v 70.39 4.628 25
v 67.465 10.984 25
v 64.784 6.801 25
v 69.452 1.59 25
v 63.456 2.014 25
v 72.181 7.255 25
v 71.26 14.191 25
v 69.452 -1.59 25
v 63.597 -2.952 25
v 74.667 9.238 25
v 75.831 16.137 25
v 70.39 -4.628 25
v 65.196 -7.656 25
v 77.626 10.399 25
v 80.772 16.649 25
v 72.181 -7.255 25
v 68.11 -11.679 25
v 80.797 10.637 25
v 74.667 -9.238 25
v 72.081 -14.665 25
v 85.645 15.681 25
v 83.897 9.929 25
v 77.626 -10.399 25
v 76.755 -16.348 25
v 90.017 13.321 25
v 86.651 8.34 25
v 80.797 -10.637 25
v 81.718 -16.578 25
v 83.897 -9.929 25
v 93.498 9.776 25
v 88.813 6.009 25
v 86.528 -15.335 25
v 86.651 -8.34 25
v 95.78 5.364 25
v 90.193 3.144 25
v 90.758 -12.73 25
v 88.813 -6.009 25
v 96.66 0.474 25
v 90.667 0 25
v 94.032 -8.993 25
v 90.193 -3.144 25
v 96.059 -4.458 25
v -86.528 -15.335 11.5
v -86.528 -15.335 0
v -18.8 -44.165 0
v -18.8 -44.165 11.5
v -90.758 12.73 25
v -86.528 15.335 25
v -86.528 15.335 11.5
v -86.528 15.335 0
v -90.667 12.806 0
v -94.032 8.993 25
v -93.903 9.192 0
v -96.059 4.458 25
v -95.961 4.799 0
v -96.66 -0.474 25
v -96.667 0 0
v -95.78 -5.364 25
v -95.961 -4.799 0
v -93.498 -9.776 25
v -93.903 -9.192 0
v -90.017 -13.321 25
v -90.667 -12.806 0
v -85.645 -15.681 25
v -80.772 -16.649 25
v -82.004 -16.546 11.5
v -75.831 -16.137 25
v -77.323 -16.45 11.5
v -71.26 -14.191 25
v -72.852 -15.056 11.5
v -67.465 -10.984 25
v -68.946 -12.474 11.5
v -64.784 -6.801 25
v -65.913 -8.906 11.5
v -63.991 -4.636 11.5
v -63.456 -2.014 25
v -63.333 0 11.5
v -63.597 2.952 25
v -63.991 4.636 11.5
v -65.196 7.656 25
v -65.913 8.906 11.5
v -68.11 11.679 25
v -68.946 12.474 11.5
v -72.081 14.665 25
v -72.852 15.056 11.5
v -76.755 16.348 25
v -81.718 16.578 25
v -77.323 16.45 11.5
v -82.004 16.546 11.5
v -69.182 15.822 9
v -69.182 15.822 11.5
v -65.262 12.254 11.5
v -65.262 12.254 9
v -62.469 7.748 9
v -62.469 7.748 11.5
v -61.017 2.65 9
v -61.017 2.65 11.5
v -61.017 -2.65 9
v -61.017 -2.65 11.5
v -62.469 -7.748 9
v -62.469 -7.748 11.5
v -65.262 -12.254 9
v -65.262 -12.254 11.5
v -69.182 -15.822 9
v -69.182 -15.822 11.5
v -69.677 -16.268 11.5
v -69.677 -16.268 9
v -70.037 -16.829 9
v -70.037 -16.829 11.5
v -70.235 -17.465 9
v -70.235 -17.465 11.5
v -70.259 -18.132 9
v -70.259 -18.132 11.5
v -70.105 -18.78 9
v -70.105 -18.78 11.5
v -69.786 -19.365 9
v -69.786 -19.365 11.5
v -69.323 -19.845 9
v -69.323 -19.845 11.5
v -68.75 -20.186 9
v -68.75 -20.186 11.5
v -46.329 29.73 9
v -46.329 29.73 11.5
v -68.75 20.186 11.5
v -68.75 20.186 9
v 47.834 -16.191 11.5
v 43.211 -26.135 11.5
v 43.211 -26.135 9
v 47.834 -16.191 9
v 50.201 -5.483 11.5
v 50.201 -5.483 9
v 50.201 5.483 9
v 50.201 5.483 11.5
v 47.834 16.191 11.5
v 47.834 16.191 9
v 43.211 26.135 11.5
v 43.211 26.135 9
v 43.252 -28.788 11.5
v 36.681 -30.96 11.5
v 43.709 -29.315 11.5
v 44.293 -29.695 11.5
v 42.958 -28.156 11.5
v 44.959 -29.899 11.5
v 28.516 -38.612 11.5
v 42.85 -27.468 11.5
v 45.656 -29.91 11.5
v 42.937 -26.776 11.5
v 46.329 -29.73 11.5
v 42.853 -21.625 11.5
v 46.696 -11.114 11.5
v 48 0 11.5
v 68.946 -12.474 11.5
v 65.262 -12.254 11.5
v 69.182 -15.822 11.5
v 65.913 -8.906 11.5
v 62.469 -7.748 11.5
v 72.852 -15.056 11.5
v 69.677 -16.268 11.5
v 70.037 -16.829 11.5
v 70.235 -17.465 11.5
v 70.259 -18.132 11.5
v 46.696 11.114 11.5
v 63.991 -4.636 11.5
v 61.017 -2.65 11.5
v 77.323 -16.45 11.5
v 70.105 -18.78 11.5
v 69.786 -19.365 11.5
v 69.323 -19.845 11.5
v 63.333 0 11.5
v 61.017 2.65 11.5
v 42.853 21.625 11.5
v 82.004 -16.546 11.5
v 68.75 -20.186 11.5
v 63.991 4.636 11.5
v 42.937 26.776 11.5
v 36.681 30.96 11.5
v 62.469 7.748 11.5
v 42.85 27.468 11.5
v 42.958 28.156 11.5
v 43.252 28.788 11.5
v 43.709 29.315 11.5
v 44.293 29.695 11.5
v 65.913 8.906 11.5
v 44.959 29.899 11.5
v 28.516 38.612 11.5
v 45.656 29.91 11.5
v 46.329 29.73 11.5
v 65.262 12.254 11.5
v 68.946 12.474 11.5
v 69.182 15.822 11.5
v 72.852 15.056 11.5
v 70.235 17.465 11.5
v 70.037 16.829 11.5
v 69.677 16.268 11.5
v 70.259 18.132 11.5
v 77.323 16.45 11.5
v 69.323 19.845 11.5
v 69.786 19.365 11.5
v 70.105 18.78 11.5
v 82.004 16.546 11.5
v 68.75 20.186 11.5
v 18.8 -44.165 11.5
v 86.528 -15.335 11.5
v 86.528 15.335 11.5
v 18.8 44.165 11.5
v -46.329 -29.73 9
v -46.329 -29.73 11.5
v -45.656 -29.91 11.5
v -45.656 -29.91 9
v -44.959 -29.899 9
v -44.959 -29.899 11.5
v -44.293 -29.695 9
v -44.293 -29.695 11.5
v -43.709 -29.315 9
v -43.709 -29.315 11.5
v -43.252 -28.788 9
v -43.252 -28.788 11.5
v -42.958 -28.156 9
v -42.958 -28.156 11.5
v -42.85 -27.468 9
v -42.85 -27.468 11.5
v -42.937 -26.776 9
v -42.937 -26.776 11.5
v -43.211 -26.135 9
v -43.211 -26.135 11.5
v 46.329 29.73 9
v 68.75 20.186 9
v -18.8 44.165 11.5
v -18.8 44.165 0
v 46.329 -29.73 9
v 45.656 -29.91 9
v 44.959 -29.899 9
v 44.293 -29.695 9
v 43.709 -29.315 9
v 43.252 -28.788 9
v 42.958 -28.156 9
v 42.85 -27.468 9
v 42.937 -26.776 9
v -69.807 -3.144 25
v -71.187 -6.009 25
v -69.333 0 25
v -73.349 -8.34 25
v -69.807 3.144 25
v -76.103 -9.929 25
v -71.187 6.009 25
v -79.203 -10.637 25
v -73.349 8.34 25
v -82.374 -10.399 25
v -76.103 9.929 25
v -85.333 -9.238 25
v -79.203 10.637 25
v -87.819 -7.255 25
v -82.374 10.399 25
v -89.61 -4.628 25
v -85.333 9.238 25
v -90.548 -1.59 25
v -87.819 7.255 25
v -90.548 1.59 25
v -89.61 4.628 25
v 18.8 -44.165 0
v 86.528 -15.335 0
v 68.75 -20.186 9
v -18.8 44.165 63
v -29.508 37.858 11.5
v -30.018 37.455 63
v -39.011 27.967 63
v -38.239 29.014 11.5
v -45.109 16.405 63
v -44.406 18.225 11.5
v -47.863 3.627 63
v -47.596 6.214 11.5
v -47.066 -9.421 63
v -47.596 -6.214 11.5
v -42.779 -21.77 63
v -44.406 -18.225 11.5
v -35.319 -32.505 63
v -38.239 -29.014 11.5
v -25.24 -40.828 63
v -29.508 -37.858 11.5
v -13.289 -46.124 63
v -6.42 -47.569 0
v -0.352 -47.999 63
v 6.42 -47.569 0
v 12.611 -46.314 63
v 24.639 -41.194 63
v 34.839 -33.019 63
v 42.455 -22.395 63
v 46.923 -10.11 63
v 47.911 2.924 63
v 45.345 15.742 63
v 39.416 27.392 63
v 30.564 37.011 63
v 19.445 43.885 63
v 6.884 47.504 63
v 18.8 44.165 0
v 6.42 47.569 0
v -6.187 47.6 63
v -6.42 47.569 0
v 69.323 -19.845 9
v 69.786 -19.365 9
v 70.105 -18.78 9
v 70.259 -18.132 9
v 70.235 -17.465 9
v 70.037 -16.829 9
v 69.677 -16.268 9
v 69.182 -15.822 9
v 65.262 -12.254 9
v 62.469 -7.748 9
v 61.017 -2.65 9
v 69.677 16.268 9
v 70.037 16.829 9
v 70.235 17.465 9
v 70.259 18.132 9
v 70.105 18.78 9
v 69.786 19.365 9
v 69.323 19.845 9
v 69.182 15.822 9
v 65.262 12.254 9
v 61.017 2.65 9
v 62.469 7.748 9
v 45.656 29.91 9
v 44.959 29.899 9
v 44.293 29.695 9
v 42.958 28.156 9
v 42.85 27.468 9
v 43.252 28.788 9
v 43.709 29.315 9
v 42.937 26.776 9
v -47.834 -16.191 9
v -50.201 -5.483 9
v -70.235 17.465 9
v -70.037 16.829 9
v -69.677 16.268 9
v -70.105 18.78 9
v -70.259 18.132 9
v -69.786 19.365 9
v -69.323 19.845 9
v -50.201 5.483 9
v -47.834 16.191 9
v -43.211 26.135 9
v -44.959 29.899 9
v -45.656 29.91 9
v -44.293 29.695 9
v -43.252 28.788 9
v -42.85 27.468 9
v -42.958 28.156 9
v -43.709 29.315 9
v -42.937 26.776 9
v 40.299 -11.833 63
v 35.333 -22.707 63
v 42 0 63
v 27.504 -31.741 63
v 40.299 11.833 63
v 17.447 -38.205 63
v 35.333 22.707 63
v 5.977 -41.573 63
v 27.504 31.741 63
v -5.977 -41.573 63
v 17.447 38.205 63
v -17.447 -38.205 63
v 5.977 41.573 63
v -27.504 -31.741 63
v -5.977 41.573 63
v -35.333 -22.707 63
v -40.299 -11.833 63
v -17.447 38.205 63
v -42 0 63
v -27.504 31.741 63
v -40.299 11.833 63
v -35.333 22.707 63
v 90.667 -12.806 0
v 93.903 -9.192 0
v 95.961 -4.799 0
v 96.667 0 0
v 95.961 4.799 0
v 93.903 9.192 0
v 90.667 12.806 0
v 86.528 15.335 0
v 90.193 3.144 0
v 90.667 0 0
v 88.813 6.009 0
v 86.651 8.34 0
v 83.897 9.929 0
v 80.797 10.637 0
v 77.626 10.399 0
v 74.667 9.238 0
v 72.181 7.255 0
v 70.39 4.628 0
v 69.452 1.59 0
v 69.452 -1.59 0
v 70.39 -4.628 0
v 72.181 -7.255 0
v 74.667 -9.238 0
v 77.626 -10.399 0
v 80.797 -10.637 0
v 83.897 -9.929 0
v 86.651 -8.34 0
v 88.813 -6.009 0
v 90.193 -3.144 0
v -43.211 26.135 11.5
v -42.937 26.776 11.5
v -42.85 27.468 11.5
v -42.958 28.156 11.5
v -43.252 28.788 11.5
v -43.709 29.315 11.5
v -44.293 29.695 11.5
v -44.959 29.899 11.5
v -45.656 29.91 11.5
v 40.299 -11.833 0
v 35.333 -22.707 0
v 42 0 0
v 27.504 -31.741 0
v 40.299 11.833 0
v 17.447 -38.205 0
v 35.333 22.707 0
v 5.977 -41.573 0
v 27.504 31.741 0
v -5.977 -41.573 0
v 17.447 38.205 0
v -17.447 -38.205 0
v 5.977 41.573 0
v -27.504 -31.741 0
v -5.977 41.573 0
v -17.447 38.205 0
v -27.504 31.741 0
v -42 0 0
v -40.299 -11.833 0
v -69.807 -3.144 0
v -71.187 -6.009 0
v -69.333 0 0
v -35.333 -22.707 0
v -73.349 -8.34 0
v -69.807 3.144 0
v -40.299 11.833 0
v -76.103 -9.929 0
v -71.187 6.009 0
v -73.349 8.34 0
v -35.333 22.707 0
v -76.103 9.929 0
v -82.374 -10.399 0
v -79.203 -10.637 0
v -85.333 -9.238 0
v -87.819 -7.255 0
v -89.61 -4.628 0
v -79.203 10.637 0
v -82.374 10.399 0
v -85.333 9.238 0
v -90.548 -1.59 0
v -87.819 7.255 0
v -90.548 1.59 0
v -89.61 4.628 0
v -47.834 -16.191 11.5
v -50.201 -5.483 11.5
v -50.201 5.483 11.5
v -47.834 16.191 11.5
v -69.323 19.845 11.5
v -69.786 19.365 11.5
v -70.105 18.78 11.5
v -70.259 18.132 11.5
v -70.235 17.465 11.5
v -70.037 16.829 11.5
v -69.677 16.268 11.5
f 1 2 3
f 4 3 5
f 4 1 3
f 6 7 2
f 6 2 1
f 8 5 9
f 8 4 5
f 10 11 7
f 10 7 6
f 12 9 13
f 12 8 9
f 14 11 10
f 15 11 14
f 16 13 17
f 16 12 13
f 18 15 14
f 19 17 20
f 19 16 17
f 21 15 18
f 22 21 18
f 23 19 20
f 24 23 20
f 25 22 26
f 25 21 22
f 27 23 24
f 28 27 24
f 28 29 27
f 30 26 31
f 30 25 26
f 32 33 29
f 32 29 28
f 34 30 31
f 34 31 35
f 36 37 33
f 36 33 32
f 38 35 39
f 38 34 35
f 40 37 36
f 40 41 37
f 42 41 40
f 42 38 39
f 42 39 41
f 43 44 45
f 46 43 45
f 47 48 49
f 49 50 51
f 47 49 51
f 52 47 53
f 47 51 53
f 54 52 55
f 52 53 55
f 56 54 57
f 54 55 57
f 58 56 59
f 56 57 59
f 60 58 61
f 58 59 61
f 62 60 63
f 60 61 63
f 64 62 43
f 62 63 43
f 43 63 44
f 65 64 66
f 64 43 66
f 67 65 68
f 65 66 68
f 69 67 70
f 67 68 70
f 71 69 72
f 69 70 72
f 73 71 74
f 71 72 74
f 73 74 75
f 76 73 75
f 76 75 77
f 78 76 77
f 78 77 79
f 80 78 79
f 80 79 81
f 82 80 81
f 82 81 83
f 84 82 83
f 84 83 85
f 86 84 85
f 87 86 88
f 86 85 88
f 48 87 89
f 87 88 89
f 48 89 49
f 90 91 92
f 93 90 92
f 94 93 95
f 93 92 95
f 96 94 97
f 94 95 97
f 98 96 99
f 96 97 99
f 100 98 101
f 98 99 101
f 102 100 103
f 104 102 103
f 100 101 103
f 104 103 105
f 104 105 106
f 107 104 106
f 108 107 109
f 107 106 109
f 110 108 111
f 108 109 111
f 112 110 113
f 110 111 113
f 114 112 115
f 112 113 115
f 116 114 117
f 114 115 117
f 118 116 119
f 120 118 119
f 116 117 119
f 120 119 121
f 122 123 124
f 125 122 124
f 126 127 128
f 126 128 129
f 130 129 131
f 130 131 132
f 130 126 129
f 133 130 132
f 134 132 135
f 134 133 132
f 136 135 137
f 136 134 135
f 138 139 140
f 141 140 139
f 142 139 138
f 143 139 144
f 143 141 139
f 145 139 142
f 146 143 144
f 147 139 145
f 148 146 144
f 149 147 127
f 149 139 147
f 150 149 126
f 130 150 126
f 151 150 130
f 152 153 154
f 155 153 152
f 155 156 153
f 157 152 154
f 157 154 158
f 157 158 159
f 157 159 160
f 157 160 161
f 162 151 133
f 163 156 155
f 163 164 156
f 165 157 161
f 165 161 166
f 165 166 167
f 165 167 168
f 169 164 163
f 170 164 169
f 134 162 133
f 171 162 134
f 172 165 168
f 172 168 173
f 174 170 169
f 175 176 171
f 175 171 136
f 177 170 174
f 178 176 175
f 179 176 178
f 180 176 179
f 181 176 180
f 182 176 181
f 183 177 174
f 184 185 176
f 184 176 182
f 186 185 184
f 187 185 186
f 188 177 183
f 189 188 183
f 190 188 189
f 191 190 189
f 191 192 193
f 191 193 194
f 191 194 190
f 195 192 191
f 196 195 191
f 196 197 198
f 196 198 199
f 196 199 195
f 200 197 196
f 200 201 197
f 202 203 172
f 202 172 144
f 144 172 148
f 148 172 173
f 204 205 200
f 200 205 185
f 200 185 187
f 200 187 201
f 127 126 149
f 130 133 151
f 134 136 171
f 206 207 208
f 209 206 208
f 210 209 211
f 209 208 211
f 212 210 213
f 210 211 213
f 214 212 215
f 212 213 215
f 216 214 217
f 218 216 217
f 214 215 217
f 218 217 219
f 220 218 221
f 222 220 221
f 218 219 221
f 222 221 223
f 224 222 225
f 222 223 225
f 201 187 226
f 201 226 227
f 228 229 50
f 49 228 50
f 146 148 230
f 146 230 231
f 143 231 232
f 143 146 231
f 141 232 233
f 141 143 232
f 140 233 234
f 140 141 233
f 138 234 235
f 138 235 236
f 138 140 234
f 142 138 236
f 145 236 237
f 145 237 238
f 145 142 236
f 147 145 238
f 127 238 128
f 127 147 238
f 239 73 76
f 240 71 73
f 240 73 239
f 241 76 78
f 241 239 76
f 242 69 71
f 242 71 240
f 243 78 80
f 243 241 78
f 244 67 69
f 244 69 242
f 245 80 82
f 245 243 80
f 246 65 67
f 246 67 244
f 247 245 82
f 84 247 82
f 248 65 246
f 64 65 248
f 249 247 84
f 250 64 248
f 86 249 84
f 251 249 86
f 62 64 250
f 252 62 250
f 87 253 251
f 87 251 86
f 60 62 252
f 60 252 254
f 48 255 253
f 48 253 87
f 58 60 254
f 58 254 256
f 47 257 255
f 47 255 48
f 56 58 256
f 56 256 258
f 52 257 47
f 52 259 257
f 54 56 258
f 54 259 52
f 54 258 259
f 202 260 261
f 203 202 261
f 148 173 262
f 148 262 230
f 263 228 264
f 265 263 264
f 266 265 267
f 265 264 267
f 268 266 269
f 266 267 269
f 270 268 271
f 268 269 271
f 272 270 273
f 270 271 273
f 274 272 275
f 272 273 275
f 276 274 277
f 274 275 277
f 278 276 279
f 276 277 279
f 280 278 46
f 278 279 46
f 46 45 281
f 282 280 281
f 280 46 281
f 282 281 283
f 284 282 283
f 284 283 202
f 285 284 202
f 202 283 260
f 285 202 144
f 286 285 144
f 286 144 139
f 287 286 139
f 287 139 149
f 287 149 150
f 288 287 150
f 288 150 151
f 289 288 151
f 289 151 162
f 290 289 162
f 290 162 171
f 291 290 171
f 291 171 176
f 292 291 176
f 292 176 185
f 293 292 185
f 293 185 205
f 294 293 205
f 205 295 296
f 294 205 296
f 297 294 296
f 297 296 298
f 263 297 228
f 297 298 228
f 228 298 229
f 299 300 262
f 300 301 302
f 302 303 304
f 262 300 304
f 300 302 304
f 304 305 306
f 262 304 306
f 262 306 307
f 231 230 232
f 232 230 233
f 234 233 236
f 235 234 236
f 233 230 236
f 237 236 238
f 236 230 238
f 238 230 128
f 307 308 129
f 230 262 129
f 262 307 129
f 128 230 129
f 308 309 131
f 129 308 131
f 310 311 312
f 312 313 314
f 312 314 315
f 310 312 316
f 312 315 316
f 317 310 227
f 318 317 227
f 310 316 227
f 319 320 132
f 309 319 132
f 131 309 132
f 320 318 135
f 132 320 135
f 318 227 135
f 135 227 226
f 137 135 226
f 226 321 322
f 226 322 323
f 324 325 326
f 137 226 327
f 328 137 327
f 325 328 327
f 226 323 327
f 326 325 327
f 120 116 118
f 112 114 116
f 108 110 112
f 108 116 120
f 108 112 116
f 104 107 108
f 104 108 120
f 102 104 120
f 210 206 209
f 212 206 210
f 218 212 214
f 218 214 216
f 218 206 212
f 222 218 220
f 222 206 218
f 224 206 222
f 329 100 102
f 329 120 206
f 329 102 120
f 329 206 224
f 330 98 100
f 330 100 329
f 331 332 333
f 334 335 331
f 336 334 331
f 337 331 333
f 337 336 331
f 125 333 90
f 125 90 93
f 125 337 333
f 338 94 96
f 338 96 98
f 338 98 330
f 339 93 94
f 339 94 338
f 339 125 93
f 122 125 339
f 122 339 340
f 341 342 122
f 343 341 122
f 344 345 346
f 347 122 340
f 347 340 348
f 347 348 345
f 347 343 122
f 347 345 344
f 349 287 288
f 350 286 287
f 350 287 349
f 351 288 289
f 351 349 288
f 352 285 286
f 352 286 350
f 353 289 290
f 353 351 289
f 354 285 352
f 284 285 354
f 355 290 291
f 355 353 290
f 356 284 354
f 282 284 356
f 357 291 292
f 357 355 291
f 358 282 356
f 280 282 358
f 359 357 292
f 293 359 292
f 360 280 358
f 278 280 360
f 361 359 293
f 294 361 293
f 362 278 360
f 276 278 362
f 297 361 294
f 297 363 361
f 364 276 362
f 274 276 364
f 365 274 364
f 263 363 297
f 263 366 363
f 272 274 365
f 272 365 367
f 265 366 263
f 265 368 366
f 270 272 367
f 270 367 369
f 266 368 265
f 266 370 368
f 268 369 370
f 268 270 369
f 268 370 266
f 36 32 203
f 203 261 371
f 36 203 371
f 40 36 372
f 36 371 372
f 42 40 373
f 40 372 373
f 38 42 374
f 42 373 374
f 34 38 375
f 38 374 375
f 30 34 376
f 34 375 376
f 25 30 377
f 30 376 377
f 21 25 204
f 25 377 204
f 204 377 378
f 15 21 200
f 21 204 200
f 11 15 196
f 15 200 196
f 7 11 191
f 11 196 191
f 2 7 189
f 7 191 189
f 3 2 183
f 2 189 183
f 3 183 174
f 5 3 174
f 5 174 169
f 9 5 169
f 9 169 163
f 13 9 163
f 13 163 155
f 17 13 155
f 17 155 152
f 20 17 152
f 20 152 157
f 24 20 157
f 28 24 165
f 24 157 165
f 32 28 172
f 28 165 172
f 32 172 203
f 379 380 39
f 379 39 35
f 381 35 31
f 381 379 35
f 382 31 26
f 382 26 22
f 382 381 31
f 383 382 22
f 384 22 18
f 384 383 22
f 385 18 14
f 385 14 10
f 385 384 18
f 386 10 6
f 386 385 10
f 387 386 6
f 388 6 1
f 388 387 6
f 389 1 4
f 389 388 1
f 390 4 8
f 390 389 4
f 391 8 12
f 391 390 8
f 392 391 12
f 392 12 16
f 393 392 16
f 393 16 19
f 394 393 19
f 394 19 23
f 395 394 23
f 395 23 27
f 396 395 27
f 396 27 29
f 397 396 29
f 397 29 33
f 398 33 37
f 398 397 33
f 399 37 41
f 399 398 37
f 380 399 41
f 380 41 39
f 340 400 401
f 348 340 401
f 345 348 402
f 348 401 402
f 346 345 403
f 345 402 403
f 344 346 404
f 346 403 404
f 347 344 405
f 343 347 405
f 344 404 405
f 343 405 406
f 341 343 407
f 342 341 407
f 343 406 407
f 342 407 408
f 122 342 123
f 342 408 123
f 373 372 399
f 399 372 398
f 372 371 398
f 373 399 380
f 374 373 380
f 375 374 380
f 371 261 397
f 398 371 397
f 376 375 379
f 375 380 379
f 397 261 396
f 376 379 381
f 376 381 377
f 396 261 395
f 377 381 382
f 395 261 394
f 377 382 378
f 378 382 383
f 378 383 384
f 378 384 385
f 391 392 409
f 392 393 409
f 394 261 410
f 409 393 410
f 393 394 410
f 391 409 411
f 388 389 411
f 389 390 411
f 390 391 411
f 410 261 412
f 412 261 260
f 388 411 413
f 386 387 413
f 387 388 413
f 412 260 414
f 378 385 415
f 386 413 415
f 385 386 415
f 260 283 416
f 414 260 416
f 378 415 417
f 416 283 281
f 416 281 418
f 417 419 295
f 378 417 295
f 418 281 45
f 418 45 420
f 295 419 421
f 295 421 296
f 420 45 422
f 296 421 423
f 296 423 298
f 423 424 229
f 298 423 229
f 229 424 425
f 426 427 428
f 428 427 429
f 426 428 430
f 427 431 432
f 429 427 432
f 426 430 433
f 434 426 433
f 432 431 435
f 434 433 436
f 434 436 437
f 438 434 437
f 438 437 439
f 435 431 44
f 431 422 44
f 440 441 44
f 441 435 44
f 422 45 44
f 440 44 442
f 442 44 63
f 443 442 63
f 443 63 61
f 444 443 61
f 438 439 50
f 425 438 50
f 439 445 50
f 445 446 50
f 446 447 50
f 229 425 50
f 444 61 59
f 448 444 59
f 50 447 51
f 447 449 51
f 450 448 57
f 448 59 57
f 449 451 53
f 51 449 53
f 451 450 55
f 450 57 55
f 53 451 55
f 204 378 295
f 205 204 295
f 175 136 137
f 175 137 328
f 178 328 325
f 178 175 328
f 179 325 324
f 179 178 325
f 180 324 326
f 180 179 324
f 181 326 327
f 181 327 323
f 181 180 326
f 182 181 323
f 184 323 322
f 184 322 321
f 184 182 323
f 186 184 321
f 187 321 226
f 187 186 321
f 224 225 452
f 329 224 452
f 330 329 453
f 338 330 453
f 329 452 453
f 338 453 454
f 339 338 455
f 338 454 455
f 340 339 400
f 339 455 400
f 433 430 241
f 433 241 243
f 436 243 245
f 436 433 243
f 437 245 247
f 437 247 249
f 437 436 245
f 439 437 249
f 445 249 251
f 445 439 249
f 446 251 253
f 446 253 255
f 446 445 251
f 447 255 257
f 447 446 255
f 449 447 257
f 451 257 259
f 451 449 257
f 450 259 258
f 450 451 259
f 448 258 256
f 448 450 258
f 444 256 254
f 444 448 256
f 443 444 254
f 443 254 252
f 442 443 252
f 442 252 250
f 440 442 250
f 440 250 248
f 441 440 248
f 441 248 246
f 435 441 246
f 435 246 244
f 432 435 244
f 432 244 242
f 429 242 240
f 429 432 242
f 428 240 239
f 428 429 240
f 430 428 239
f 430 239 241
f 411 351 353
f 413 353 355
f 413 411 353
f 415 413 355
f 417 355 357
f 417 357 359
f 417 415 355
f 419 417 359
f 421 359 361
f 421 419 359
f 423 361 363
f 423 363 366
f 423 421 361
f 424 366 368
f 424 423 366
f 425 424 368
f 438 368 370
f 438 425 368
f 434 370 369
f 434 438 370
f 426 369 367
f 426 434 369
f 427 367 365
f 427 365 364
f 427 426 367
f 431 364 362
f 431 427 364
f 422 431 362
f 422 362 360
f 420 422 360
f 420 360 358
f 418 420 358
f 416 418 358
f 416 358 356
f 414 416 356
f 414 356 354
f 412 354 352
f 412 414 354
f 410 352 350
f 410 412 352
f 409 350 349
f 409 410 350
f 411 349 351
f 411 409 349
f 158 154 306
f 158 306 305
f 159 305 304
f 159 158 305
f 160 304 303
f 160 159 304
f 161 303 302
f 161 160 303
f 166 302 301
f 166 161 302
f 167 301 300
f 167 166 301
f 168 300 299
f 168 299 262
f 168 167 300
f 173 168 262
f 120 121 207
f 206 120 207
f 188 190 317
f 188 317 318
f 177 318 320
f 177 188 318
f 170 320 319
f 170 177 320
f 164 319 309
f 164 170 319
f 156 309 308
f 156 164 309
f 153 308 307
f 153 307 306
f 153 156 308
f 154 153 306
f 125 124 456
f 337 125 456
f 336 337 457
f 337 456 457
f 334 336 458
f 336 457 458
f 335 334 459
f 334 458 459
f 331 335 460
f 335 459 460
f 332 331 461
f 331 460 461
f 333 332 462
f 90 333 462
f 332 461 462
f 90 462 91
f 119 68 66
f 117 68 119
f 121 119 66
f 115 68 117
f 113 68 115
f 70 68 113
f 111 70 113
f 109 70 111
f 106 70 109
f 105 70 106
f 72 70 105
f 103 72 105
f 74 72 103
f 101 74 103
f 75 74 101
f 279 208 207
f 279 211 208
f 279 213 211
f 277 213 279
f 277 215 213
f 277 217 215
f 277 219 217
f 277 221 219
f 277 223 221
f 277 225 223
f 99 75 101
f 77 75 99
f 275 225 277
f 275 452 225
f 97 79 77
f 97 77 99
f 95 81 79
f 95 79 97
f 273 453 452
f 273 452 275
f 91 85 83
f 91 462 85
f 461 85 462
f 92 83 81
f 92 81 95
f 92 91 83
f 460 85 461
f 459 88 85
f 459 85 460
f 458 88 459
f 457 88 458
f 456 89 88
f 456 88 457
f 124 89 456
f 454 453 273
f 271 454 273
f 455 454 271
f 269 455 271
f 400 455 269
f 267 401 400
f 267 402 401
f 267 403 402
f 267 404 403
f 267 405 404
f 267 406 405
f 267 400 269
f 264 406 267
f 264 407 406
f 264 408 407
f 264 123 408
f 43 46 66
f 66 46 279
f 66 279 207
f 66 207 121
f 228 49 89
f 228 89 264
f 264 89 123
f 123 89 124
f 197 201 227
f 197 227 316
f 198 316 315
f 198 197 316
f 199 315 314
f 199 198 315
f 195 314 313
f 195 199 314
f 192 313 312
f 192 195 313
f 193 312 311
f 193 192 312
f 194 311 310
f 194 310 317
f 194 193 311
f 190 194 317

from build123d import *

# Parameters (mm, degrees)
BOSS_EXTRUDE1_DEPTH   = 11.5
BOSS_EXTRUDE1_2_DEPTH = 11.5
CUT_EXTRUDE1_DEPTH    = 2.5
SKETCH1_4_R           = 16.666666667
SKETCH1_4_R_2         = 10.666666667
BOSS_EXTRUDE2_DEPTH   = 25
SKETCH1_5_R           = 42
BOSS_EXTRUDE3_DEPTH   = 63


with BuildPart() as part:
    # Sketch1 → Boss-Extrude1 (new body)
    with BuildSketch(Plane.XY):
        with BuildLine():
            ThreePointArc((18.8, 44.165144628), (48, 0), (18.8, -44.165144628))
            Line((18.8, -44.165144628), (86.527777778, -15.335119662))
            ThreePointArc((86.527777778, -15.335119662), (63.333333333, 0), (86.527777778, 15.335119662))
            Line((86.527777778, 15.335119662), (18.8, 44.165144628))
        make_face()
    extrude(amount=BOSS_EXTRUDE1_DEPTH)


with BuildPart() as body_2:
    # Sketch1 → Boss-Extrude1 2 (new body)
    with BuildSketch(Plane.XY):
        with BuildLine():
            Line((-86.527777778, -15.335119662), (-18.8, -44.165144628))
            ThreePointArc((-18.8, -44.165144628), (-48, 0), (-18.8, 44.165144628))
            Line((-18.8, 44.165144628), (-86.527777778, 15.335119662))
            ThreePointArc((-86.527777778, 15.335119662), (-63.333333333, 0), (-86.527777778, -15.335119662))
        make_face()
    extrude(amount=BOSS_EXTRUDE1_2_DEPTH)

    # Sketch2 → Cut-Extrude1 (cut)
    with BuildSketch(Plane.XY.offset(11.5)):
        with BuildLine():
            Line((-46.329311604, 29.72952886), (-68.749829189, 20.185673992))
            ThreePointArc((-68.749829189, 20.185673992), (-70.258507425, 18.131633045), (-69.181739923, 15.821705345))
            ThreePointArc((-69.181739923, 15.821705345), (-60.833333333, 0), (-69.181739923, -15.821705345))
            ThreePointArc((-69.181739923, -15.821705345), (-70.258507425, -18.131633045), (-68.749829189, -20.185673992))
            Line((-68.749829189, -20.185673992), (-46.329311604, -29.72952886))
            ThreePointArc((-46.329311604, -29.72952886), (-43.461816215, -29.067618209), (-43.210987158, -26.135427849))
            ThreePointArc((-43.210987158, -26.135427849), (-50.5, 0), (-43.210987158, 26.135427849))
            ThreePointArc((-43.210987158, 26.135427849), (-43.461816215, 29.067618209), (-46.329311604, 29.72952886))
        make_face()
    cut_extrude1 = extrude(amount=-CUT_EXTRUDE1_DEPTH, mode=Mode.SUBTRACT)


with BuildPart() as part_1:
    add(part.part)

    # Mirror1: Cut-Extrude1 across plane
    add(cut_extrude1.mirror(Plane(origin=(0, 0, 0), x_dir=(0, 0, 1), z_dir=(1, 0, 0))), mode=Mode.SUBTRACT)

    add(body_2.part)  # Boss-Extrude2 merges body 2
    # Sketch1<4> → Boss-Extrude2 (add)
    # profile 1 of 2: a face of its own
    with BuildSketch(Plane.XY):
        with Locations((80, 0)):
            Circle(SKETCH1_4_R)
        with Locations((80, 0)):
            Circle(SKETCH1_4_R_2, mode=Mode.SUBTRACT)
    # profile 2 of 2: a face of its own
    with BuildSketch(Plane.XY):
        with Locations((-80, 0)):
            Circle(SKETCH1_4_R)
        with Locations((-80, 0)):
            Circle(SKETCH1_4_R_2, mode=Mode.SUBTRACT)
    extrude(amount=BOSS_EXTRUDE2_DEPTH)

    # Sketch1<5> → Boss-Extrude3 (add)
    with BuildSketch(Plane.XY):
        with BuildLine():
            ThreePointArc((-18.8, -44.165144628), (0, -48), (18.8, -44.165144628))
            ThreePointArc((18.8, -44.165144628), (40.03998002, -26.472627372), (48, 0))
            ThreePointArc((48, 0), (40.03998002, 26.472627372), (18.8, 44.165144628))
            ThreePointArc((18.8, 44.165144628), (0, 48), (-18.8, 44.165144628))
            ThreePointArc((-18.8, 44.165144628), (-48, 0), (-18.8, -44.165144628))
        make_face()
        Circle(SKETCH1_5_R, mode=Mode.SUBTRACT)
    extrude(amount=BOSS_EXTRUDE3_DEPTH)


solid = part_1.part
